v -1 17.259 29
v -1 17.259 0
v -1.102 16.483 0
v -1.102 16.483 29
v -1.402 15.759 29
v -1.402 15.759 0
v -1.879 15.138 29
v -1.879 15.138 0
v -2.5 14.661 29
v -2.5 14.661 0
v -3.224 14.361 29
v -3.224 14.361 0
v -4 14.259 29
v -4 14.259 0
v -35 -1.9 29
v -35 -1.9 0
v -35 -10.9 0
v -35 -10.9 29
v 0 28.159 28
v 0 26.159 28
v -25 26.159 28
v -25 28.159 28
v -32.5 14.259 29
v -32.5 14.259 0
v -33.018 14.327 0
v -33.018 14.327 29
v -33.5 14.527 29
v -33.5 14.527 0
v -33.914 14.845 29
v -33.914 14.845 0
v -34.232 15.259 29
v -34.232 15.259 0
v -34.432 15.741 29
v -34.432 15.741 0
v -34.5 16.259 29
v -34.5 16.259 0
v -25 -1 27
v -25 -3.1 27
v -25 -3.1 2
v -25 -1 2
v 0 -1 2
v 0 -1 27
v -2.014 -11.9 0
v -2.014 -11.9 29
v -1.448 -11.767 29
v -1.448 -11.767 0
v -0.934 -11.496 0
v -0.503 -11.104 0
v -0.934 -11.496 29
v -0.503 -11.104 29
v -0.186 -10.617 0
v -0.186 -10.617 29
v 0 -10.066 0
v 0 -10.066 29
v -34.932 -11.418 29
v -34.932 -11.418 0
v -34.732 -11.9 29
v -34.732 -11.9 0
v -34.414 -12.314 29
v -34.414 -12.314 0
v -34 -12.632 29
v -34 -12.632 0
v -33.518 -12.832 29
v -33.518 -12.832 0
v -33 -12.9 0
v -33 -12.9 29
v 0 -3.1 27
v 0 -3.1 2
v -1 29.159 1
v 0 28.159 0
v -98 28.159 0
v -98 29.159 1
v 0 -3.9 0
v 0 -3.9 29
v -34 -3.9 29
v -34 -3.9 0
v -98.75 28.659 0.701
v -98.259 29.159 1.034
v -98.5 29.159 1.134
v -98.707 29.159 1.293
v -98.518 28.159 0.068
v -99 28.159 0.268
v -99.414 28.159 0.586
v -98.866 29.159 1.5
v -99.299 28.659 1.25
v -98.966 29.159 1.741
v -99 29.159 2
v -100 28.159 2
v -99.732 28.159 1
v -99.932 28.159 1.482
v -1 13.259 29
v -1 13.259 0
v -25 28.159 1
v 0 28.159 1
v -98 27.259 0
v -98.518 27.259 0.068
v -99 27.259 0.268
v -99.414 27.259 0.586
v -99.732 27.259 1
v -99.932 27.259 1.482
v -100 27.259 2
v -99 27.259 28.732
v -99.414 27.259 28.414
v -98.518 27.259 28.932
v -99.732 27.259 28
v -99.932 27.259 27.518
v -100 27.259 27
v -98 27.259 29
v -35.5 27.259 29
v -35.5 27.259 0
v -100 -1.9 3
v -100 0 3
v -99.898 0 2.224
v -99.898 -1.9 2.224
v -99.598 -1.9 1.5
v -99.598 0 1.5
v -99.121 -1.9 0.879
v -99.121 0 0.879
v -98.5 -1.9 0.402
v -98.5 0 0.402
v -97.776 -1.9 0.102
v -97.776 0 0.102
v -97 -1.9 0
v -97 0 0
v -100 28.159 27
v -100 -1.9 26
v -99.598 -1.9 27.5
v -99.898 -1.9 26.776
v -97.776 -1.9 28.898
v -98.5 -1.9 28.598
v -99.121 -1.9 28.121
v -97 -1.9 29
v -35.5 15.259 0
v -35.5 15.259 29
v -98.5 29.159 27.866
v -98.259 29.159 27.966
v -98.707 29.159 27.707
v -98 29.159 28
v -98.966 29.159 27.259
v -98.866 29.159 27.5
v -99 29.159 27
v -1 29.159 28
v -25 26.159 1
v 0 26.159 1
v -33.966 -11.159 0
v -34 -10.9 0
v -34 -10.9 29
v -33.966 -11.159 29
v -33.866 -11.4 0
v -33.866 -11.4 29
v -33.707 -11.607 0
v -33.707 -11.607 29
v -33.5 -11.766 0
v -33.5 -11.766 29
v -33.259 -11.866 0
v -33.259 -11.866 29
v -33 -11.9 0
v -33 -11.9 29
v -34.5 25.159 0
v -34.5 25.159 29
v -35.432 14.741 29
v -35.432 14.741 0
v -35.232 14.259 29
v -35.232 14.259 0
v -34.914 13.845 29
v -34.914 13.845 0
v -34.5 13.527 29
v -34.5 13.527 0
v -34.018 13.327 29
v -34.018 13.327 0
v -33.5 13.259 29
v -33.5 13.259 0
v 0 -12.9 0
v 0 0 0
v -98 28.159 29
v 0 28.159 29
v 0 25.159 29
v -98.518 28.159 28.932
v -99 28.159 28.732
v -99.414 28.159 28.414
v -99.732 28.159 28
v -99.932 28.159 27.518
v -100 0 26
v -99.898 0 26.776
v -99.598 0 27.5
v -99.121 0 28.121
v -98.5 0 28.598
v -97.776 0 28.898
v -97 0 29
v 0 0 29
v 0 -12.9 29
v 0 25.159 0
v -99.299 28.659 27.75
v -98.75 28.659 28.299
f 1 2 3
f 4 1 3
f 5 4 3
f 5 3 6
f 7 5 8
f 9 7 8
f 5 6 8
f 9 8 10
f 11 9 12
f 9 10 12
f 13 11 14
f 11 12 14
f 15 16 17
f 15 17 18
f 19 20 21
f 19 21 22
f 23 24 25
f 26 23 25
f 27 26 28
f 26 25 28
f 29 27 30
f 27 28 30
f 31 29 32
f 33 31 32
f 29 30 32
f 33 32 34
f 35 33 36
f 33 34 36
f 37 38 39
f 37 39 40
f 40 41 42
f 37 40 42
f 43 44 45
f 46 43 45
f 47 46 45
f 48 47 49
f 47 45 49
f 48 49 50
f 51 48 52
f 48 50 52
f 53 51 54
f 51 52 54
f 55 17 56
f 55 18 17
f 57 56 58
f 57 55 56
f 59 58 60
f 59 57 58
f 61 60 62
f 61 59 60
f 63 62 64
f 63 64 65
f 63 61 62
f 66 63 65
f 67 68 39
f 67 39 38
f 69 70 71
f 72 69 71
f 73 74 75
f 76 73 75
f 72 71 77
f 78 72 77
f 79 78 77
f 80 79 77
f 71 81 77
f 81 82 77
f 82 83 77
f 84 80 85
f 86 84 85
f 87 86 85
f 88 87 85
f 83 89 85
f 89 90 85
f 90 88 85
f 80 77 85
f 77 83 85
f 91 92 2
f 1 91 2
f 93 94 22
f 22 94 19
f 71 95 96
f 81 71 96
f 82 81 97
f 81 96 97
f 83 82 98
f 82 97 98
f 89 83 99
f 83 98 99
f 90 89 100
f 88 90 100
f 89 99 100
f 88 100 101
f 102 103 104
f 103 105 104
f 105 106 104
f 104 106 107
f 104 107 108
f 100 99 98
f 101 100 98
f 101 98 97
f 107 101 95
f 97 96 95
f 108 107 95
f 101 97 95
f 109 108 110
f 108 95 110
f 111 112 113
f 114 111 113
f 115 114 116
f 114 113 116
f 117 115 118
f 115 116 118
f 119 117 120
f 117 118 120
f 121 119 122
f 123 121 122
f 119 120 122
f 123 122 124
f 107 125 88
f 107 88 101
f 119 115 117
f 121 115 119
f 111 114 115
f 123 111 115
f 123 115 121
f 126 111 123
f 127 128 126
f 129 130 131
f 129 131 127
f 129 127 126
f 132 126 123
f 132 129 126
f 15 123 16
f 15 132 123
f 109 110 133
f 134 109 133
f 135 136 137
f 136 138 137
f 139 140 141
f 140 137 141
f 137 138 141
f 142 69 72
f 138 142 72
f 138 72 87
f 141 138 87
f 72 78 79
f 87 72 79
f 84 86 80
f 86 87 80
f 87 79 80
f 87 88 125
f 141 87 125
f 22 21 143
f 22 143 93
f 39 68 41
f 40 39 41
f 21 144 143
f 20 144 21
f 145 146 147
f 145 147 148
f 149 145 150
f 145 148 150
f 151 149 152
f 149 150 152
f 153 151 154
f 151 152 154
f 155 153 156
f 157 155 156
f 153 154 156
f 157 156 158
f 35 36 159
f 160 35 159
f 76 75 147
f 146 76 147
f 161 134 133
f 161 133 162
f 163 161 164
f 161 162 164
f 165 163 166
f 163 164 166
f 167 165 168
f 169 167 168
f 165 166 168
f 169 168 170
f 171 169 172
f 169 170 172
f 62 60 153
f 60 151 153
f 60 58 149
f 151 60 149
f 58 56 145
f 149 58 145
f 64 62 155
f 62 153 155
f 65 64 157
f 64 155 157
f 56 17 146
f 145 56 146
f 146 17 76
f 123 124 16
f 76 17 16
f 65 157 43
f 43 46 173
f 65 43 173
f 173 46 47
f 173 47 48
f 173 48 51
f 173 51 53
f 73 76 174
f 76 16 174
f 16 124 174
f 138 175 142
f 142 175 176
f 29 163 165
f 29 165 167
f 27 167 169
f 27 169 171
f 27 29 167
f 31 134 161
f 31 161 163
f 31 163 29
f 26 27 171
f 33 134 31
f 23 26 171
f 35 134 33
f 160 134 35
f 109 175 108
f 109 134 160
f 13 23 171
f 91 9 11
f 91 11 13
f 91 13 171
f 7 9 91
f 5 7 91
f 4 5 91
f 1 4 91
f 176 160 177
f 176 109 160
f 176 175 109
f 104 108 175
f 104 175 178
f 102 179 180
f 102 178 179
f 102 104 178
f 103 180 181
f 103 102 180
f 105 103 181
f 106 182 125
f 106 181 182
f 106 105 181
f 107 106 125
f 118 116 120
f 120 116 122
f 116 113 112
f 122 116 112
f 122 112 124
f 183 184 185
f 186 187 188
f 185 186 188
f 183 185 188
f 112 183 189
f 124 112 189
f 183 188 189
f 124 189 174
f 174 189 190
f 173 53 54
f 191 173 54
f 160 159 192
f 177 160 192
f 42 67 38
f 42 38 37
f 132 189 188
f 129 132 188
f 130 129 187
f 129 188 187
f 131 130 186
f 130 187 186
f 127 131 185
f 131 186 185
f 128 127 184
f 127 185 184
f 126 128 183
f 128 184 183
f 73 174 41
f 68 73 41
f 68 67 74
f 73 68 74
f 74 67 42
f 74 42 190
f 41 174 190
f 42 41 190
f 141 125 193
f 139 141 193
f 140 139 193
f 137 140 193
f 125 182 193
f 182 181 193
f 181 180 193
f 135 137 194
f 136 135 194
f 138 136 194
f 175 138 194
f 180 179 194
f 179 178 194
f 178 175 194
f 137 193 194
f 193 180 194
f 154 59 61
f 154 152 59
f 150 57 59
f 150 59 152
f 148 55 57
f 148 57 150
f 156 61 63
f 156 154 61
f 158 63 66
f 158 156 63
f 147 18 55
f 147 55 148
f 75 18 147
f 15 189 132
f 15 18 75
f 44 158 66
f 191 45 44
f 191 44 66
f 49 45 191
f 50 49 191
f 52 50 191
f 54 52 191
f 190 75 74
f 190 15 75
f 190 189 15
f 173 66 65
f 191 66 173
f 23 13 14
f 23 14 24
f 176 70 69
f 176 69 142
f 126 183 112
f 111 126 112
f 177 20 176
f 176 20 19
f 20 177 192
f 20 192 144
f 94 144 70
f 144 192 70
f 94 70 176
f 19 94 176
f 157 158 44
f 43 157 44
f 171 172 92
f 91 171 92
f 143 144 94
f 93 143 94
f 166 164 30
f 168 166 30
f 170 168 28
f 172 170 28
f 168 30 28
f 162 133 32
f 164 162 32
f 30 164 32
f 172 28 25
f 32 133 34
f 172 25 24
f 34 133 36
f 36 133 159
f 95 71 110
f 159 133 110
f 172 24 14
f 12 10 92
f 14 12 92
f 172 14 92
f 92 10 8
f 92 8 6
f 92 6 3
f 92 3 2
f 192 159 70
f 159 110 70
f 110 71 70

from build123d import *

# Parameters (mm, degrees)
F1_DEPTH  = 1.9
F0_W      = 35
F0_H      = 29
F2_DEPTH  = 12.9
F3_W      = 2.1
F3_H      = 25
F4_DEPTH  = 25
F5_R      = 2
F7_DEPTH  = 29
F9_DEPTH  = 29
F10_W     = 2
F10_H     = 27
F11_DEPTH = 25
F14_R     = 2
F15_SIZE  = 0.99999


# Not quite as in the source:
# - a fillet or chamfer is up to 0.001 mm smaller than in the source, because OpenCascade refuses the exact size


with BuildPart() as f1:
    # F0 (on Front) → F1 (new body)
    with BuildSketch(Plane.XZ):
        with BuildLine():
            Line((-97, 0), (-35, 0))
            Line((-35, 0), (-35, 29))
            Line((-35, 29), (-97, 29))
            ThreePointArc((-97, 29), (-99.1213203436, 28.1213203436), (-100, 26))
            Line((-100, 26), (-100, 3))
            ThreePointArc((-100, 3), (-99.1213203436, 0.8786796564), (-97, 0))
        make_face()
    extrude(amount=F1_DEPTH)

    # F0 (on Front) → F2 (join)
    with BuildSketch(Plane.XZ):
        with Locations((-17.5, 14.5)):
            Rectangle(F0_W, F0_H)
    extrude(amount=F2_DEPTH)

    # F3 (on face) → F4 (cut)
    with BuildSketch(Plane.YZ):
        with Locations((-2.05, 14.5)):
            Rectangle(F3_W, F3_H)
    extrude(amount=-F4_DEPTH, mode=Mode.SUBTRACT)

    # F5
    f5_edges = [f1.edges().sort_by_distance(p)[0] for p in [
        (-35, -12.9, 14.5),
    ]]
    fillet(f5_edges, radius=F5_R)

    # F6 (on face) → F7 (cut)
    with BuildSketch(Plane.XY.offset(29)):
        with BuildLine():
            Line((-34.0000018477, -3.9), (-34.0000018477, -10.9))
            ThreePointArc((-34.0000018477, -10.9), (-33.7071080877, -11.6071080877), (-33, -11.9000018477))
            Line((-33, -11.9000018477), (-2.4920476135, -11.9000018477))
            Line((-2.4920476135, -11.9000018477), (-2.0143143377, -11.9000018477))
            ThreePointArc((-2.0143143377, -11.9000018477), (-0.7060689283, -11.3136245624), (0, -10.0659022213))
            Line((0, -10.0659022213), (0, -9.1630909592))
            Line((0, -9.1630909592), (0, -3.9))
            Line((0, -3.9), (-34.0000018477, -3.9))
        make_face()
    extrude(amount=-F7_DEPTH, mode=Mode.SUBTRACT)


with BuildPart() as f9:
    # F8 (on Top) → F9 (new body)
    with BuildSketch(Plane.XY):
        with BuildLine():
            Line((0, 25.1590552804), (0, 29.1590552804))
            Line((0, 29.1590552804), (-100, 29.1590552804))
            Line((-100, 29.1590552804), (-100, 27.2590552804))
            Line((-100, 27.2590552804), (-35.5, 27.2590552804))
            Line((-35.5, 27.2590552804), (-35.5, 15.2590552804))
            ThreePointArc((-35.5, 15.2590552804), (-34.9142135624, 13.8448417181), (-33.5, 13.2590552804))
            Line((-33.5, 13.2590552804), (-1, 13.2590552804))
            Line((-1, 13.2590552804), (-1, 17.2590552804))
            ThreePointArc((-1, 17.2590552804), (-1.8786796564, 15.1377349369), (-4, 14.2590552804))
            Line((-4, 14.2590552804), (-32.5, 14.2590552804))
            ThreePointArc((-32.5, 14.2590552804), (-33.9142135624, 14.8448417181), (-34.5, 16.2590552804))
            Line((-34.5, 16.2590552804), (-34.5, 25.1590552804))
            Line((-34.5, 25.1590552804), (0, 25.1590552804))
        make_face()
    extrude(amount=F9_DEPTH)

    # F10 (on face) → F11 (cut)
    with BuildSketch(Plane.YZ):
        with Locations((27.1590552804, 14.5)):
            Rectangle(F10_W, F10_H)
    extrude(amount=-F11_DEPTH, mode=Mode.SUBTRACT)


with BuildPart() as f12_1:
    # F12: copy of F9
    add(f9.part.moved(Location((0, 30, 0))))


with BuildPart() as f9_1:
    add(f9.part)

    # F14
    f14_edges = [f9_1.edges().sort_by_distance(p)[0] for p in [
        (-100, 28.209055, 29),
        (-100, 28.209055, 0),
    ]]
    fillet(f14_edges, radius=F14_R)

    # F15 (size 1 in the source; OpenCascade refuses exactly that, so slightly less here)
    f15_edges = [f9_1.edges().sort_by_distance(p)[0] for p in [
        (-100, 29.159055, 14.5),
        (-99.414214, 29.159055, 0.585786),
        (-99.414214, 29.159055, 28.414214),
        (-49, 29.159055, 0),
        (-49, 29.159055, 29),
        (0, 29.159055, 14.5),
    ]]
    chamfer(f15_edges, length=F15_SIZE)


solid = Compound([f1.part, f9_1.part])
